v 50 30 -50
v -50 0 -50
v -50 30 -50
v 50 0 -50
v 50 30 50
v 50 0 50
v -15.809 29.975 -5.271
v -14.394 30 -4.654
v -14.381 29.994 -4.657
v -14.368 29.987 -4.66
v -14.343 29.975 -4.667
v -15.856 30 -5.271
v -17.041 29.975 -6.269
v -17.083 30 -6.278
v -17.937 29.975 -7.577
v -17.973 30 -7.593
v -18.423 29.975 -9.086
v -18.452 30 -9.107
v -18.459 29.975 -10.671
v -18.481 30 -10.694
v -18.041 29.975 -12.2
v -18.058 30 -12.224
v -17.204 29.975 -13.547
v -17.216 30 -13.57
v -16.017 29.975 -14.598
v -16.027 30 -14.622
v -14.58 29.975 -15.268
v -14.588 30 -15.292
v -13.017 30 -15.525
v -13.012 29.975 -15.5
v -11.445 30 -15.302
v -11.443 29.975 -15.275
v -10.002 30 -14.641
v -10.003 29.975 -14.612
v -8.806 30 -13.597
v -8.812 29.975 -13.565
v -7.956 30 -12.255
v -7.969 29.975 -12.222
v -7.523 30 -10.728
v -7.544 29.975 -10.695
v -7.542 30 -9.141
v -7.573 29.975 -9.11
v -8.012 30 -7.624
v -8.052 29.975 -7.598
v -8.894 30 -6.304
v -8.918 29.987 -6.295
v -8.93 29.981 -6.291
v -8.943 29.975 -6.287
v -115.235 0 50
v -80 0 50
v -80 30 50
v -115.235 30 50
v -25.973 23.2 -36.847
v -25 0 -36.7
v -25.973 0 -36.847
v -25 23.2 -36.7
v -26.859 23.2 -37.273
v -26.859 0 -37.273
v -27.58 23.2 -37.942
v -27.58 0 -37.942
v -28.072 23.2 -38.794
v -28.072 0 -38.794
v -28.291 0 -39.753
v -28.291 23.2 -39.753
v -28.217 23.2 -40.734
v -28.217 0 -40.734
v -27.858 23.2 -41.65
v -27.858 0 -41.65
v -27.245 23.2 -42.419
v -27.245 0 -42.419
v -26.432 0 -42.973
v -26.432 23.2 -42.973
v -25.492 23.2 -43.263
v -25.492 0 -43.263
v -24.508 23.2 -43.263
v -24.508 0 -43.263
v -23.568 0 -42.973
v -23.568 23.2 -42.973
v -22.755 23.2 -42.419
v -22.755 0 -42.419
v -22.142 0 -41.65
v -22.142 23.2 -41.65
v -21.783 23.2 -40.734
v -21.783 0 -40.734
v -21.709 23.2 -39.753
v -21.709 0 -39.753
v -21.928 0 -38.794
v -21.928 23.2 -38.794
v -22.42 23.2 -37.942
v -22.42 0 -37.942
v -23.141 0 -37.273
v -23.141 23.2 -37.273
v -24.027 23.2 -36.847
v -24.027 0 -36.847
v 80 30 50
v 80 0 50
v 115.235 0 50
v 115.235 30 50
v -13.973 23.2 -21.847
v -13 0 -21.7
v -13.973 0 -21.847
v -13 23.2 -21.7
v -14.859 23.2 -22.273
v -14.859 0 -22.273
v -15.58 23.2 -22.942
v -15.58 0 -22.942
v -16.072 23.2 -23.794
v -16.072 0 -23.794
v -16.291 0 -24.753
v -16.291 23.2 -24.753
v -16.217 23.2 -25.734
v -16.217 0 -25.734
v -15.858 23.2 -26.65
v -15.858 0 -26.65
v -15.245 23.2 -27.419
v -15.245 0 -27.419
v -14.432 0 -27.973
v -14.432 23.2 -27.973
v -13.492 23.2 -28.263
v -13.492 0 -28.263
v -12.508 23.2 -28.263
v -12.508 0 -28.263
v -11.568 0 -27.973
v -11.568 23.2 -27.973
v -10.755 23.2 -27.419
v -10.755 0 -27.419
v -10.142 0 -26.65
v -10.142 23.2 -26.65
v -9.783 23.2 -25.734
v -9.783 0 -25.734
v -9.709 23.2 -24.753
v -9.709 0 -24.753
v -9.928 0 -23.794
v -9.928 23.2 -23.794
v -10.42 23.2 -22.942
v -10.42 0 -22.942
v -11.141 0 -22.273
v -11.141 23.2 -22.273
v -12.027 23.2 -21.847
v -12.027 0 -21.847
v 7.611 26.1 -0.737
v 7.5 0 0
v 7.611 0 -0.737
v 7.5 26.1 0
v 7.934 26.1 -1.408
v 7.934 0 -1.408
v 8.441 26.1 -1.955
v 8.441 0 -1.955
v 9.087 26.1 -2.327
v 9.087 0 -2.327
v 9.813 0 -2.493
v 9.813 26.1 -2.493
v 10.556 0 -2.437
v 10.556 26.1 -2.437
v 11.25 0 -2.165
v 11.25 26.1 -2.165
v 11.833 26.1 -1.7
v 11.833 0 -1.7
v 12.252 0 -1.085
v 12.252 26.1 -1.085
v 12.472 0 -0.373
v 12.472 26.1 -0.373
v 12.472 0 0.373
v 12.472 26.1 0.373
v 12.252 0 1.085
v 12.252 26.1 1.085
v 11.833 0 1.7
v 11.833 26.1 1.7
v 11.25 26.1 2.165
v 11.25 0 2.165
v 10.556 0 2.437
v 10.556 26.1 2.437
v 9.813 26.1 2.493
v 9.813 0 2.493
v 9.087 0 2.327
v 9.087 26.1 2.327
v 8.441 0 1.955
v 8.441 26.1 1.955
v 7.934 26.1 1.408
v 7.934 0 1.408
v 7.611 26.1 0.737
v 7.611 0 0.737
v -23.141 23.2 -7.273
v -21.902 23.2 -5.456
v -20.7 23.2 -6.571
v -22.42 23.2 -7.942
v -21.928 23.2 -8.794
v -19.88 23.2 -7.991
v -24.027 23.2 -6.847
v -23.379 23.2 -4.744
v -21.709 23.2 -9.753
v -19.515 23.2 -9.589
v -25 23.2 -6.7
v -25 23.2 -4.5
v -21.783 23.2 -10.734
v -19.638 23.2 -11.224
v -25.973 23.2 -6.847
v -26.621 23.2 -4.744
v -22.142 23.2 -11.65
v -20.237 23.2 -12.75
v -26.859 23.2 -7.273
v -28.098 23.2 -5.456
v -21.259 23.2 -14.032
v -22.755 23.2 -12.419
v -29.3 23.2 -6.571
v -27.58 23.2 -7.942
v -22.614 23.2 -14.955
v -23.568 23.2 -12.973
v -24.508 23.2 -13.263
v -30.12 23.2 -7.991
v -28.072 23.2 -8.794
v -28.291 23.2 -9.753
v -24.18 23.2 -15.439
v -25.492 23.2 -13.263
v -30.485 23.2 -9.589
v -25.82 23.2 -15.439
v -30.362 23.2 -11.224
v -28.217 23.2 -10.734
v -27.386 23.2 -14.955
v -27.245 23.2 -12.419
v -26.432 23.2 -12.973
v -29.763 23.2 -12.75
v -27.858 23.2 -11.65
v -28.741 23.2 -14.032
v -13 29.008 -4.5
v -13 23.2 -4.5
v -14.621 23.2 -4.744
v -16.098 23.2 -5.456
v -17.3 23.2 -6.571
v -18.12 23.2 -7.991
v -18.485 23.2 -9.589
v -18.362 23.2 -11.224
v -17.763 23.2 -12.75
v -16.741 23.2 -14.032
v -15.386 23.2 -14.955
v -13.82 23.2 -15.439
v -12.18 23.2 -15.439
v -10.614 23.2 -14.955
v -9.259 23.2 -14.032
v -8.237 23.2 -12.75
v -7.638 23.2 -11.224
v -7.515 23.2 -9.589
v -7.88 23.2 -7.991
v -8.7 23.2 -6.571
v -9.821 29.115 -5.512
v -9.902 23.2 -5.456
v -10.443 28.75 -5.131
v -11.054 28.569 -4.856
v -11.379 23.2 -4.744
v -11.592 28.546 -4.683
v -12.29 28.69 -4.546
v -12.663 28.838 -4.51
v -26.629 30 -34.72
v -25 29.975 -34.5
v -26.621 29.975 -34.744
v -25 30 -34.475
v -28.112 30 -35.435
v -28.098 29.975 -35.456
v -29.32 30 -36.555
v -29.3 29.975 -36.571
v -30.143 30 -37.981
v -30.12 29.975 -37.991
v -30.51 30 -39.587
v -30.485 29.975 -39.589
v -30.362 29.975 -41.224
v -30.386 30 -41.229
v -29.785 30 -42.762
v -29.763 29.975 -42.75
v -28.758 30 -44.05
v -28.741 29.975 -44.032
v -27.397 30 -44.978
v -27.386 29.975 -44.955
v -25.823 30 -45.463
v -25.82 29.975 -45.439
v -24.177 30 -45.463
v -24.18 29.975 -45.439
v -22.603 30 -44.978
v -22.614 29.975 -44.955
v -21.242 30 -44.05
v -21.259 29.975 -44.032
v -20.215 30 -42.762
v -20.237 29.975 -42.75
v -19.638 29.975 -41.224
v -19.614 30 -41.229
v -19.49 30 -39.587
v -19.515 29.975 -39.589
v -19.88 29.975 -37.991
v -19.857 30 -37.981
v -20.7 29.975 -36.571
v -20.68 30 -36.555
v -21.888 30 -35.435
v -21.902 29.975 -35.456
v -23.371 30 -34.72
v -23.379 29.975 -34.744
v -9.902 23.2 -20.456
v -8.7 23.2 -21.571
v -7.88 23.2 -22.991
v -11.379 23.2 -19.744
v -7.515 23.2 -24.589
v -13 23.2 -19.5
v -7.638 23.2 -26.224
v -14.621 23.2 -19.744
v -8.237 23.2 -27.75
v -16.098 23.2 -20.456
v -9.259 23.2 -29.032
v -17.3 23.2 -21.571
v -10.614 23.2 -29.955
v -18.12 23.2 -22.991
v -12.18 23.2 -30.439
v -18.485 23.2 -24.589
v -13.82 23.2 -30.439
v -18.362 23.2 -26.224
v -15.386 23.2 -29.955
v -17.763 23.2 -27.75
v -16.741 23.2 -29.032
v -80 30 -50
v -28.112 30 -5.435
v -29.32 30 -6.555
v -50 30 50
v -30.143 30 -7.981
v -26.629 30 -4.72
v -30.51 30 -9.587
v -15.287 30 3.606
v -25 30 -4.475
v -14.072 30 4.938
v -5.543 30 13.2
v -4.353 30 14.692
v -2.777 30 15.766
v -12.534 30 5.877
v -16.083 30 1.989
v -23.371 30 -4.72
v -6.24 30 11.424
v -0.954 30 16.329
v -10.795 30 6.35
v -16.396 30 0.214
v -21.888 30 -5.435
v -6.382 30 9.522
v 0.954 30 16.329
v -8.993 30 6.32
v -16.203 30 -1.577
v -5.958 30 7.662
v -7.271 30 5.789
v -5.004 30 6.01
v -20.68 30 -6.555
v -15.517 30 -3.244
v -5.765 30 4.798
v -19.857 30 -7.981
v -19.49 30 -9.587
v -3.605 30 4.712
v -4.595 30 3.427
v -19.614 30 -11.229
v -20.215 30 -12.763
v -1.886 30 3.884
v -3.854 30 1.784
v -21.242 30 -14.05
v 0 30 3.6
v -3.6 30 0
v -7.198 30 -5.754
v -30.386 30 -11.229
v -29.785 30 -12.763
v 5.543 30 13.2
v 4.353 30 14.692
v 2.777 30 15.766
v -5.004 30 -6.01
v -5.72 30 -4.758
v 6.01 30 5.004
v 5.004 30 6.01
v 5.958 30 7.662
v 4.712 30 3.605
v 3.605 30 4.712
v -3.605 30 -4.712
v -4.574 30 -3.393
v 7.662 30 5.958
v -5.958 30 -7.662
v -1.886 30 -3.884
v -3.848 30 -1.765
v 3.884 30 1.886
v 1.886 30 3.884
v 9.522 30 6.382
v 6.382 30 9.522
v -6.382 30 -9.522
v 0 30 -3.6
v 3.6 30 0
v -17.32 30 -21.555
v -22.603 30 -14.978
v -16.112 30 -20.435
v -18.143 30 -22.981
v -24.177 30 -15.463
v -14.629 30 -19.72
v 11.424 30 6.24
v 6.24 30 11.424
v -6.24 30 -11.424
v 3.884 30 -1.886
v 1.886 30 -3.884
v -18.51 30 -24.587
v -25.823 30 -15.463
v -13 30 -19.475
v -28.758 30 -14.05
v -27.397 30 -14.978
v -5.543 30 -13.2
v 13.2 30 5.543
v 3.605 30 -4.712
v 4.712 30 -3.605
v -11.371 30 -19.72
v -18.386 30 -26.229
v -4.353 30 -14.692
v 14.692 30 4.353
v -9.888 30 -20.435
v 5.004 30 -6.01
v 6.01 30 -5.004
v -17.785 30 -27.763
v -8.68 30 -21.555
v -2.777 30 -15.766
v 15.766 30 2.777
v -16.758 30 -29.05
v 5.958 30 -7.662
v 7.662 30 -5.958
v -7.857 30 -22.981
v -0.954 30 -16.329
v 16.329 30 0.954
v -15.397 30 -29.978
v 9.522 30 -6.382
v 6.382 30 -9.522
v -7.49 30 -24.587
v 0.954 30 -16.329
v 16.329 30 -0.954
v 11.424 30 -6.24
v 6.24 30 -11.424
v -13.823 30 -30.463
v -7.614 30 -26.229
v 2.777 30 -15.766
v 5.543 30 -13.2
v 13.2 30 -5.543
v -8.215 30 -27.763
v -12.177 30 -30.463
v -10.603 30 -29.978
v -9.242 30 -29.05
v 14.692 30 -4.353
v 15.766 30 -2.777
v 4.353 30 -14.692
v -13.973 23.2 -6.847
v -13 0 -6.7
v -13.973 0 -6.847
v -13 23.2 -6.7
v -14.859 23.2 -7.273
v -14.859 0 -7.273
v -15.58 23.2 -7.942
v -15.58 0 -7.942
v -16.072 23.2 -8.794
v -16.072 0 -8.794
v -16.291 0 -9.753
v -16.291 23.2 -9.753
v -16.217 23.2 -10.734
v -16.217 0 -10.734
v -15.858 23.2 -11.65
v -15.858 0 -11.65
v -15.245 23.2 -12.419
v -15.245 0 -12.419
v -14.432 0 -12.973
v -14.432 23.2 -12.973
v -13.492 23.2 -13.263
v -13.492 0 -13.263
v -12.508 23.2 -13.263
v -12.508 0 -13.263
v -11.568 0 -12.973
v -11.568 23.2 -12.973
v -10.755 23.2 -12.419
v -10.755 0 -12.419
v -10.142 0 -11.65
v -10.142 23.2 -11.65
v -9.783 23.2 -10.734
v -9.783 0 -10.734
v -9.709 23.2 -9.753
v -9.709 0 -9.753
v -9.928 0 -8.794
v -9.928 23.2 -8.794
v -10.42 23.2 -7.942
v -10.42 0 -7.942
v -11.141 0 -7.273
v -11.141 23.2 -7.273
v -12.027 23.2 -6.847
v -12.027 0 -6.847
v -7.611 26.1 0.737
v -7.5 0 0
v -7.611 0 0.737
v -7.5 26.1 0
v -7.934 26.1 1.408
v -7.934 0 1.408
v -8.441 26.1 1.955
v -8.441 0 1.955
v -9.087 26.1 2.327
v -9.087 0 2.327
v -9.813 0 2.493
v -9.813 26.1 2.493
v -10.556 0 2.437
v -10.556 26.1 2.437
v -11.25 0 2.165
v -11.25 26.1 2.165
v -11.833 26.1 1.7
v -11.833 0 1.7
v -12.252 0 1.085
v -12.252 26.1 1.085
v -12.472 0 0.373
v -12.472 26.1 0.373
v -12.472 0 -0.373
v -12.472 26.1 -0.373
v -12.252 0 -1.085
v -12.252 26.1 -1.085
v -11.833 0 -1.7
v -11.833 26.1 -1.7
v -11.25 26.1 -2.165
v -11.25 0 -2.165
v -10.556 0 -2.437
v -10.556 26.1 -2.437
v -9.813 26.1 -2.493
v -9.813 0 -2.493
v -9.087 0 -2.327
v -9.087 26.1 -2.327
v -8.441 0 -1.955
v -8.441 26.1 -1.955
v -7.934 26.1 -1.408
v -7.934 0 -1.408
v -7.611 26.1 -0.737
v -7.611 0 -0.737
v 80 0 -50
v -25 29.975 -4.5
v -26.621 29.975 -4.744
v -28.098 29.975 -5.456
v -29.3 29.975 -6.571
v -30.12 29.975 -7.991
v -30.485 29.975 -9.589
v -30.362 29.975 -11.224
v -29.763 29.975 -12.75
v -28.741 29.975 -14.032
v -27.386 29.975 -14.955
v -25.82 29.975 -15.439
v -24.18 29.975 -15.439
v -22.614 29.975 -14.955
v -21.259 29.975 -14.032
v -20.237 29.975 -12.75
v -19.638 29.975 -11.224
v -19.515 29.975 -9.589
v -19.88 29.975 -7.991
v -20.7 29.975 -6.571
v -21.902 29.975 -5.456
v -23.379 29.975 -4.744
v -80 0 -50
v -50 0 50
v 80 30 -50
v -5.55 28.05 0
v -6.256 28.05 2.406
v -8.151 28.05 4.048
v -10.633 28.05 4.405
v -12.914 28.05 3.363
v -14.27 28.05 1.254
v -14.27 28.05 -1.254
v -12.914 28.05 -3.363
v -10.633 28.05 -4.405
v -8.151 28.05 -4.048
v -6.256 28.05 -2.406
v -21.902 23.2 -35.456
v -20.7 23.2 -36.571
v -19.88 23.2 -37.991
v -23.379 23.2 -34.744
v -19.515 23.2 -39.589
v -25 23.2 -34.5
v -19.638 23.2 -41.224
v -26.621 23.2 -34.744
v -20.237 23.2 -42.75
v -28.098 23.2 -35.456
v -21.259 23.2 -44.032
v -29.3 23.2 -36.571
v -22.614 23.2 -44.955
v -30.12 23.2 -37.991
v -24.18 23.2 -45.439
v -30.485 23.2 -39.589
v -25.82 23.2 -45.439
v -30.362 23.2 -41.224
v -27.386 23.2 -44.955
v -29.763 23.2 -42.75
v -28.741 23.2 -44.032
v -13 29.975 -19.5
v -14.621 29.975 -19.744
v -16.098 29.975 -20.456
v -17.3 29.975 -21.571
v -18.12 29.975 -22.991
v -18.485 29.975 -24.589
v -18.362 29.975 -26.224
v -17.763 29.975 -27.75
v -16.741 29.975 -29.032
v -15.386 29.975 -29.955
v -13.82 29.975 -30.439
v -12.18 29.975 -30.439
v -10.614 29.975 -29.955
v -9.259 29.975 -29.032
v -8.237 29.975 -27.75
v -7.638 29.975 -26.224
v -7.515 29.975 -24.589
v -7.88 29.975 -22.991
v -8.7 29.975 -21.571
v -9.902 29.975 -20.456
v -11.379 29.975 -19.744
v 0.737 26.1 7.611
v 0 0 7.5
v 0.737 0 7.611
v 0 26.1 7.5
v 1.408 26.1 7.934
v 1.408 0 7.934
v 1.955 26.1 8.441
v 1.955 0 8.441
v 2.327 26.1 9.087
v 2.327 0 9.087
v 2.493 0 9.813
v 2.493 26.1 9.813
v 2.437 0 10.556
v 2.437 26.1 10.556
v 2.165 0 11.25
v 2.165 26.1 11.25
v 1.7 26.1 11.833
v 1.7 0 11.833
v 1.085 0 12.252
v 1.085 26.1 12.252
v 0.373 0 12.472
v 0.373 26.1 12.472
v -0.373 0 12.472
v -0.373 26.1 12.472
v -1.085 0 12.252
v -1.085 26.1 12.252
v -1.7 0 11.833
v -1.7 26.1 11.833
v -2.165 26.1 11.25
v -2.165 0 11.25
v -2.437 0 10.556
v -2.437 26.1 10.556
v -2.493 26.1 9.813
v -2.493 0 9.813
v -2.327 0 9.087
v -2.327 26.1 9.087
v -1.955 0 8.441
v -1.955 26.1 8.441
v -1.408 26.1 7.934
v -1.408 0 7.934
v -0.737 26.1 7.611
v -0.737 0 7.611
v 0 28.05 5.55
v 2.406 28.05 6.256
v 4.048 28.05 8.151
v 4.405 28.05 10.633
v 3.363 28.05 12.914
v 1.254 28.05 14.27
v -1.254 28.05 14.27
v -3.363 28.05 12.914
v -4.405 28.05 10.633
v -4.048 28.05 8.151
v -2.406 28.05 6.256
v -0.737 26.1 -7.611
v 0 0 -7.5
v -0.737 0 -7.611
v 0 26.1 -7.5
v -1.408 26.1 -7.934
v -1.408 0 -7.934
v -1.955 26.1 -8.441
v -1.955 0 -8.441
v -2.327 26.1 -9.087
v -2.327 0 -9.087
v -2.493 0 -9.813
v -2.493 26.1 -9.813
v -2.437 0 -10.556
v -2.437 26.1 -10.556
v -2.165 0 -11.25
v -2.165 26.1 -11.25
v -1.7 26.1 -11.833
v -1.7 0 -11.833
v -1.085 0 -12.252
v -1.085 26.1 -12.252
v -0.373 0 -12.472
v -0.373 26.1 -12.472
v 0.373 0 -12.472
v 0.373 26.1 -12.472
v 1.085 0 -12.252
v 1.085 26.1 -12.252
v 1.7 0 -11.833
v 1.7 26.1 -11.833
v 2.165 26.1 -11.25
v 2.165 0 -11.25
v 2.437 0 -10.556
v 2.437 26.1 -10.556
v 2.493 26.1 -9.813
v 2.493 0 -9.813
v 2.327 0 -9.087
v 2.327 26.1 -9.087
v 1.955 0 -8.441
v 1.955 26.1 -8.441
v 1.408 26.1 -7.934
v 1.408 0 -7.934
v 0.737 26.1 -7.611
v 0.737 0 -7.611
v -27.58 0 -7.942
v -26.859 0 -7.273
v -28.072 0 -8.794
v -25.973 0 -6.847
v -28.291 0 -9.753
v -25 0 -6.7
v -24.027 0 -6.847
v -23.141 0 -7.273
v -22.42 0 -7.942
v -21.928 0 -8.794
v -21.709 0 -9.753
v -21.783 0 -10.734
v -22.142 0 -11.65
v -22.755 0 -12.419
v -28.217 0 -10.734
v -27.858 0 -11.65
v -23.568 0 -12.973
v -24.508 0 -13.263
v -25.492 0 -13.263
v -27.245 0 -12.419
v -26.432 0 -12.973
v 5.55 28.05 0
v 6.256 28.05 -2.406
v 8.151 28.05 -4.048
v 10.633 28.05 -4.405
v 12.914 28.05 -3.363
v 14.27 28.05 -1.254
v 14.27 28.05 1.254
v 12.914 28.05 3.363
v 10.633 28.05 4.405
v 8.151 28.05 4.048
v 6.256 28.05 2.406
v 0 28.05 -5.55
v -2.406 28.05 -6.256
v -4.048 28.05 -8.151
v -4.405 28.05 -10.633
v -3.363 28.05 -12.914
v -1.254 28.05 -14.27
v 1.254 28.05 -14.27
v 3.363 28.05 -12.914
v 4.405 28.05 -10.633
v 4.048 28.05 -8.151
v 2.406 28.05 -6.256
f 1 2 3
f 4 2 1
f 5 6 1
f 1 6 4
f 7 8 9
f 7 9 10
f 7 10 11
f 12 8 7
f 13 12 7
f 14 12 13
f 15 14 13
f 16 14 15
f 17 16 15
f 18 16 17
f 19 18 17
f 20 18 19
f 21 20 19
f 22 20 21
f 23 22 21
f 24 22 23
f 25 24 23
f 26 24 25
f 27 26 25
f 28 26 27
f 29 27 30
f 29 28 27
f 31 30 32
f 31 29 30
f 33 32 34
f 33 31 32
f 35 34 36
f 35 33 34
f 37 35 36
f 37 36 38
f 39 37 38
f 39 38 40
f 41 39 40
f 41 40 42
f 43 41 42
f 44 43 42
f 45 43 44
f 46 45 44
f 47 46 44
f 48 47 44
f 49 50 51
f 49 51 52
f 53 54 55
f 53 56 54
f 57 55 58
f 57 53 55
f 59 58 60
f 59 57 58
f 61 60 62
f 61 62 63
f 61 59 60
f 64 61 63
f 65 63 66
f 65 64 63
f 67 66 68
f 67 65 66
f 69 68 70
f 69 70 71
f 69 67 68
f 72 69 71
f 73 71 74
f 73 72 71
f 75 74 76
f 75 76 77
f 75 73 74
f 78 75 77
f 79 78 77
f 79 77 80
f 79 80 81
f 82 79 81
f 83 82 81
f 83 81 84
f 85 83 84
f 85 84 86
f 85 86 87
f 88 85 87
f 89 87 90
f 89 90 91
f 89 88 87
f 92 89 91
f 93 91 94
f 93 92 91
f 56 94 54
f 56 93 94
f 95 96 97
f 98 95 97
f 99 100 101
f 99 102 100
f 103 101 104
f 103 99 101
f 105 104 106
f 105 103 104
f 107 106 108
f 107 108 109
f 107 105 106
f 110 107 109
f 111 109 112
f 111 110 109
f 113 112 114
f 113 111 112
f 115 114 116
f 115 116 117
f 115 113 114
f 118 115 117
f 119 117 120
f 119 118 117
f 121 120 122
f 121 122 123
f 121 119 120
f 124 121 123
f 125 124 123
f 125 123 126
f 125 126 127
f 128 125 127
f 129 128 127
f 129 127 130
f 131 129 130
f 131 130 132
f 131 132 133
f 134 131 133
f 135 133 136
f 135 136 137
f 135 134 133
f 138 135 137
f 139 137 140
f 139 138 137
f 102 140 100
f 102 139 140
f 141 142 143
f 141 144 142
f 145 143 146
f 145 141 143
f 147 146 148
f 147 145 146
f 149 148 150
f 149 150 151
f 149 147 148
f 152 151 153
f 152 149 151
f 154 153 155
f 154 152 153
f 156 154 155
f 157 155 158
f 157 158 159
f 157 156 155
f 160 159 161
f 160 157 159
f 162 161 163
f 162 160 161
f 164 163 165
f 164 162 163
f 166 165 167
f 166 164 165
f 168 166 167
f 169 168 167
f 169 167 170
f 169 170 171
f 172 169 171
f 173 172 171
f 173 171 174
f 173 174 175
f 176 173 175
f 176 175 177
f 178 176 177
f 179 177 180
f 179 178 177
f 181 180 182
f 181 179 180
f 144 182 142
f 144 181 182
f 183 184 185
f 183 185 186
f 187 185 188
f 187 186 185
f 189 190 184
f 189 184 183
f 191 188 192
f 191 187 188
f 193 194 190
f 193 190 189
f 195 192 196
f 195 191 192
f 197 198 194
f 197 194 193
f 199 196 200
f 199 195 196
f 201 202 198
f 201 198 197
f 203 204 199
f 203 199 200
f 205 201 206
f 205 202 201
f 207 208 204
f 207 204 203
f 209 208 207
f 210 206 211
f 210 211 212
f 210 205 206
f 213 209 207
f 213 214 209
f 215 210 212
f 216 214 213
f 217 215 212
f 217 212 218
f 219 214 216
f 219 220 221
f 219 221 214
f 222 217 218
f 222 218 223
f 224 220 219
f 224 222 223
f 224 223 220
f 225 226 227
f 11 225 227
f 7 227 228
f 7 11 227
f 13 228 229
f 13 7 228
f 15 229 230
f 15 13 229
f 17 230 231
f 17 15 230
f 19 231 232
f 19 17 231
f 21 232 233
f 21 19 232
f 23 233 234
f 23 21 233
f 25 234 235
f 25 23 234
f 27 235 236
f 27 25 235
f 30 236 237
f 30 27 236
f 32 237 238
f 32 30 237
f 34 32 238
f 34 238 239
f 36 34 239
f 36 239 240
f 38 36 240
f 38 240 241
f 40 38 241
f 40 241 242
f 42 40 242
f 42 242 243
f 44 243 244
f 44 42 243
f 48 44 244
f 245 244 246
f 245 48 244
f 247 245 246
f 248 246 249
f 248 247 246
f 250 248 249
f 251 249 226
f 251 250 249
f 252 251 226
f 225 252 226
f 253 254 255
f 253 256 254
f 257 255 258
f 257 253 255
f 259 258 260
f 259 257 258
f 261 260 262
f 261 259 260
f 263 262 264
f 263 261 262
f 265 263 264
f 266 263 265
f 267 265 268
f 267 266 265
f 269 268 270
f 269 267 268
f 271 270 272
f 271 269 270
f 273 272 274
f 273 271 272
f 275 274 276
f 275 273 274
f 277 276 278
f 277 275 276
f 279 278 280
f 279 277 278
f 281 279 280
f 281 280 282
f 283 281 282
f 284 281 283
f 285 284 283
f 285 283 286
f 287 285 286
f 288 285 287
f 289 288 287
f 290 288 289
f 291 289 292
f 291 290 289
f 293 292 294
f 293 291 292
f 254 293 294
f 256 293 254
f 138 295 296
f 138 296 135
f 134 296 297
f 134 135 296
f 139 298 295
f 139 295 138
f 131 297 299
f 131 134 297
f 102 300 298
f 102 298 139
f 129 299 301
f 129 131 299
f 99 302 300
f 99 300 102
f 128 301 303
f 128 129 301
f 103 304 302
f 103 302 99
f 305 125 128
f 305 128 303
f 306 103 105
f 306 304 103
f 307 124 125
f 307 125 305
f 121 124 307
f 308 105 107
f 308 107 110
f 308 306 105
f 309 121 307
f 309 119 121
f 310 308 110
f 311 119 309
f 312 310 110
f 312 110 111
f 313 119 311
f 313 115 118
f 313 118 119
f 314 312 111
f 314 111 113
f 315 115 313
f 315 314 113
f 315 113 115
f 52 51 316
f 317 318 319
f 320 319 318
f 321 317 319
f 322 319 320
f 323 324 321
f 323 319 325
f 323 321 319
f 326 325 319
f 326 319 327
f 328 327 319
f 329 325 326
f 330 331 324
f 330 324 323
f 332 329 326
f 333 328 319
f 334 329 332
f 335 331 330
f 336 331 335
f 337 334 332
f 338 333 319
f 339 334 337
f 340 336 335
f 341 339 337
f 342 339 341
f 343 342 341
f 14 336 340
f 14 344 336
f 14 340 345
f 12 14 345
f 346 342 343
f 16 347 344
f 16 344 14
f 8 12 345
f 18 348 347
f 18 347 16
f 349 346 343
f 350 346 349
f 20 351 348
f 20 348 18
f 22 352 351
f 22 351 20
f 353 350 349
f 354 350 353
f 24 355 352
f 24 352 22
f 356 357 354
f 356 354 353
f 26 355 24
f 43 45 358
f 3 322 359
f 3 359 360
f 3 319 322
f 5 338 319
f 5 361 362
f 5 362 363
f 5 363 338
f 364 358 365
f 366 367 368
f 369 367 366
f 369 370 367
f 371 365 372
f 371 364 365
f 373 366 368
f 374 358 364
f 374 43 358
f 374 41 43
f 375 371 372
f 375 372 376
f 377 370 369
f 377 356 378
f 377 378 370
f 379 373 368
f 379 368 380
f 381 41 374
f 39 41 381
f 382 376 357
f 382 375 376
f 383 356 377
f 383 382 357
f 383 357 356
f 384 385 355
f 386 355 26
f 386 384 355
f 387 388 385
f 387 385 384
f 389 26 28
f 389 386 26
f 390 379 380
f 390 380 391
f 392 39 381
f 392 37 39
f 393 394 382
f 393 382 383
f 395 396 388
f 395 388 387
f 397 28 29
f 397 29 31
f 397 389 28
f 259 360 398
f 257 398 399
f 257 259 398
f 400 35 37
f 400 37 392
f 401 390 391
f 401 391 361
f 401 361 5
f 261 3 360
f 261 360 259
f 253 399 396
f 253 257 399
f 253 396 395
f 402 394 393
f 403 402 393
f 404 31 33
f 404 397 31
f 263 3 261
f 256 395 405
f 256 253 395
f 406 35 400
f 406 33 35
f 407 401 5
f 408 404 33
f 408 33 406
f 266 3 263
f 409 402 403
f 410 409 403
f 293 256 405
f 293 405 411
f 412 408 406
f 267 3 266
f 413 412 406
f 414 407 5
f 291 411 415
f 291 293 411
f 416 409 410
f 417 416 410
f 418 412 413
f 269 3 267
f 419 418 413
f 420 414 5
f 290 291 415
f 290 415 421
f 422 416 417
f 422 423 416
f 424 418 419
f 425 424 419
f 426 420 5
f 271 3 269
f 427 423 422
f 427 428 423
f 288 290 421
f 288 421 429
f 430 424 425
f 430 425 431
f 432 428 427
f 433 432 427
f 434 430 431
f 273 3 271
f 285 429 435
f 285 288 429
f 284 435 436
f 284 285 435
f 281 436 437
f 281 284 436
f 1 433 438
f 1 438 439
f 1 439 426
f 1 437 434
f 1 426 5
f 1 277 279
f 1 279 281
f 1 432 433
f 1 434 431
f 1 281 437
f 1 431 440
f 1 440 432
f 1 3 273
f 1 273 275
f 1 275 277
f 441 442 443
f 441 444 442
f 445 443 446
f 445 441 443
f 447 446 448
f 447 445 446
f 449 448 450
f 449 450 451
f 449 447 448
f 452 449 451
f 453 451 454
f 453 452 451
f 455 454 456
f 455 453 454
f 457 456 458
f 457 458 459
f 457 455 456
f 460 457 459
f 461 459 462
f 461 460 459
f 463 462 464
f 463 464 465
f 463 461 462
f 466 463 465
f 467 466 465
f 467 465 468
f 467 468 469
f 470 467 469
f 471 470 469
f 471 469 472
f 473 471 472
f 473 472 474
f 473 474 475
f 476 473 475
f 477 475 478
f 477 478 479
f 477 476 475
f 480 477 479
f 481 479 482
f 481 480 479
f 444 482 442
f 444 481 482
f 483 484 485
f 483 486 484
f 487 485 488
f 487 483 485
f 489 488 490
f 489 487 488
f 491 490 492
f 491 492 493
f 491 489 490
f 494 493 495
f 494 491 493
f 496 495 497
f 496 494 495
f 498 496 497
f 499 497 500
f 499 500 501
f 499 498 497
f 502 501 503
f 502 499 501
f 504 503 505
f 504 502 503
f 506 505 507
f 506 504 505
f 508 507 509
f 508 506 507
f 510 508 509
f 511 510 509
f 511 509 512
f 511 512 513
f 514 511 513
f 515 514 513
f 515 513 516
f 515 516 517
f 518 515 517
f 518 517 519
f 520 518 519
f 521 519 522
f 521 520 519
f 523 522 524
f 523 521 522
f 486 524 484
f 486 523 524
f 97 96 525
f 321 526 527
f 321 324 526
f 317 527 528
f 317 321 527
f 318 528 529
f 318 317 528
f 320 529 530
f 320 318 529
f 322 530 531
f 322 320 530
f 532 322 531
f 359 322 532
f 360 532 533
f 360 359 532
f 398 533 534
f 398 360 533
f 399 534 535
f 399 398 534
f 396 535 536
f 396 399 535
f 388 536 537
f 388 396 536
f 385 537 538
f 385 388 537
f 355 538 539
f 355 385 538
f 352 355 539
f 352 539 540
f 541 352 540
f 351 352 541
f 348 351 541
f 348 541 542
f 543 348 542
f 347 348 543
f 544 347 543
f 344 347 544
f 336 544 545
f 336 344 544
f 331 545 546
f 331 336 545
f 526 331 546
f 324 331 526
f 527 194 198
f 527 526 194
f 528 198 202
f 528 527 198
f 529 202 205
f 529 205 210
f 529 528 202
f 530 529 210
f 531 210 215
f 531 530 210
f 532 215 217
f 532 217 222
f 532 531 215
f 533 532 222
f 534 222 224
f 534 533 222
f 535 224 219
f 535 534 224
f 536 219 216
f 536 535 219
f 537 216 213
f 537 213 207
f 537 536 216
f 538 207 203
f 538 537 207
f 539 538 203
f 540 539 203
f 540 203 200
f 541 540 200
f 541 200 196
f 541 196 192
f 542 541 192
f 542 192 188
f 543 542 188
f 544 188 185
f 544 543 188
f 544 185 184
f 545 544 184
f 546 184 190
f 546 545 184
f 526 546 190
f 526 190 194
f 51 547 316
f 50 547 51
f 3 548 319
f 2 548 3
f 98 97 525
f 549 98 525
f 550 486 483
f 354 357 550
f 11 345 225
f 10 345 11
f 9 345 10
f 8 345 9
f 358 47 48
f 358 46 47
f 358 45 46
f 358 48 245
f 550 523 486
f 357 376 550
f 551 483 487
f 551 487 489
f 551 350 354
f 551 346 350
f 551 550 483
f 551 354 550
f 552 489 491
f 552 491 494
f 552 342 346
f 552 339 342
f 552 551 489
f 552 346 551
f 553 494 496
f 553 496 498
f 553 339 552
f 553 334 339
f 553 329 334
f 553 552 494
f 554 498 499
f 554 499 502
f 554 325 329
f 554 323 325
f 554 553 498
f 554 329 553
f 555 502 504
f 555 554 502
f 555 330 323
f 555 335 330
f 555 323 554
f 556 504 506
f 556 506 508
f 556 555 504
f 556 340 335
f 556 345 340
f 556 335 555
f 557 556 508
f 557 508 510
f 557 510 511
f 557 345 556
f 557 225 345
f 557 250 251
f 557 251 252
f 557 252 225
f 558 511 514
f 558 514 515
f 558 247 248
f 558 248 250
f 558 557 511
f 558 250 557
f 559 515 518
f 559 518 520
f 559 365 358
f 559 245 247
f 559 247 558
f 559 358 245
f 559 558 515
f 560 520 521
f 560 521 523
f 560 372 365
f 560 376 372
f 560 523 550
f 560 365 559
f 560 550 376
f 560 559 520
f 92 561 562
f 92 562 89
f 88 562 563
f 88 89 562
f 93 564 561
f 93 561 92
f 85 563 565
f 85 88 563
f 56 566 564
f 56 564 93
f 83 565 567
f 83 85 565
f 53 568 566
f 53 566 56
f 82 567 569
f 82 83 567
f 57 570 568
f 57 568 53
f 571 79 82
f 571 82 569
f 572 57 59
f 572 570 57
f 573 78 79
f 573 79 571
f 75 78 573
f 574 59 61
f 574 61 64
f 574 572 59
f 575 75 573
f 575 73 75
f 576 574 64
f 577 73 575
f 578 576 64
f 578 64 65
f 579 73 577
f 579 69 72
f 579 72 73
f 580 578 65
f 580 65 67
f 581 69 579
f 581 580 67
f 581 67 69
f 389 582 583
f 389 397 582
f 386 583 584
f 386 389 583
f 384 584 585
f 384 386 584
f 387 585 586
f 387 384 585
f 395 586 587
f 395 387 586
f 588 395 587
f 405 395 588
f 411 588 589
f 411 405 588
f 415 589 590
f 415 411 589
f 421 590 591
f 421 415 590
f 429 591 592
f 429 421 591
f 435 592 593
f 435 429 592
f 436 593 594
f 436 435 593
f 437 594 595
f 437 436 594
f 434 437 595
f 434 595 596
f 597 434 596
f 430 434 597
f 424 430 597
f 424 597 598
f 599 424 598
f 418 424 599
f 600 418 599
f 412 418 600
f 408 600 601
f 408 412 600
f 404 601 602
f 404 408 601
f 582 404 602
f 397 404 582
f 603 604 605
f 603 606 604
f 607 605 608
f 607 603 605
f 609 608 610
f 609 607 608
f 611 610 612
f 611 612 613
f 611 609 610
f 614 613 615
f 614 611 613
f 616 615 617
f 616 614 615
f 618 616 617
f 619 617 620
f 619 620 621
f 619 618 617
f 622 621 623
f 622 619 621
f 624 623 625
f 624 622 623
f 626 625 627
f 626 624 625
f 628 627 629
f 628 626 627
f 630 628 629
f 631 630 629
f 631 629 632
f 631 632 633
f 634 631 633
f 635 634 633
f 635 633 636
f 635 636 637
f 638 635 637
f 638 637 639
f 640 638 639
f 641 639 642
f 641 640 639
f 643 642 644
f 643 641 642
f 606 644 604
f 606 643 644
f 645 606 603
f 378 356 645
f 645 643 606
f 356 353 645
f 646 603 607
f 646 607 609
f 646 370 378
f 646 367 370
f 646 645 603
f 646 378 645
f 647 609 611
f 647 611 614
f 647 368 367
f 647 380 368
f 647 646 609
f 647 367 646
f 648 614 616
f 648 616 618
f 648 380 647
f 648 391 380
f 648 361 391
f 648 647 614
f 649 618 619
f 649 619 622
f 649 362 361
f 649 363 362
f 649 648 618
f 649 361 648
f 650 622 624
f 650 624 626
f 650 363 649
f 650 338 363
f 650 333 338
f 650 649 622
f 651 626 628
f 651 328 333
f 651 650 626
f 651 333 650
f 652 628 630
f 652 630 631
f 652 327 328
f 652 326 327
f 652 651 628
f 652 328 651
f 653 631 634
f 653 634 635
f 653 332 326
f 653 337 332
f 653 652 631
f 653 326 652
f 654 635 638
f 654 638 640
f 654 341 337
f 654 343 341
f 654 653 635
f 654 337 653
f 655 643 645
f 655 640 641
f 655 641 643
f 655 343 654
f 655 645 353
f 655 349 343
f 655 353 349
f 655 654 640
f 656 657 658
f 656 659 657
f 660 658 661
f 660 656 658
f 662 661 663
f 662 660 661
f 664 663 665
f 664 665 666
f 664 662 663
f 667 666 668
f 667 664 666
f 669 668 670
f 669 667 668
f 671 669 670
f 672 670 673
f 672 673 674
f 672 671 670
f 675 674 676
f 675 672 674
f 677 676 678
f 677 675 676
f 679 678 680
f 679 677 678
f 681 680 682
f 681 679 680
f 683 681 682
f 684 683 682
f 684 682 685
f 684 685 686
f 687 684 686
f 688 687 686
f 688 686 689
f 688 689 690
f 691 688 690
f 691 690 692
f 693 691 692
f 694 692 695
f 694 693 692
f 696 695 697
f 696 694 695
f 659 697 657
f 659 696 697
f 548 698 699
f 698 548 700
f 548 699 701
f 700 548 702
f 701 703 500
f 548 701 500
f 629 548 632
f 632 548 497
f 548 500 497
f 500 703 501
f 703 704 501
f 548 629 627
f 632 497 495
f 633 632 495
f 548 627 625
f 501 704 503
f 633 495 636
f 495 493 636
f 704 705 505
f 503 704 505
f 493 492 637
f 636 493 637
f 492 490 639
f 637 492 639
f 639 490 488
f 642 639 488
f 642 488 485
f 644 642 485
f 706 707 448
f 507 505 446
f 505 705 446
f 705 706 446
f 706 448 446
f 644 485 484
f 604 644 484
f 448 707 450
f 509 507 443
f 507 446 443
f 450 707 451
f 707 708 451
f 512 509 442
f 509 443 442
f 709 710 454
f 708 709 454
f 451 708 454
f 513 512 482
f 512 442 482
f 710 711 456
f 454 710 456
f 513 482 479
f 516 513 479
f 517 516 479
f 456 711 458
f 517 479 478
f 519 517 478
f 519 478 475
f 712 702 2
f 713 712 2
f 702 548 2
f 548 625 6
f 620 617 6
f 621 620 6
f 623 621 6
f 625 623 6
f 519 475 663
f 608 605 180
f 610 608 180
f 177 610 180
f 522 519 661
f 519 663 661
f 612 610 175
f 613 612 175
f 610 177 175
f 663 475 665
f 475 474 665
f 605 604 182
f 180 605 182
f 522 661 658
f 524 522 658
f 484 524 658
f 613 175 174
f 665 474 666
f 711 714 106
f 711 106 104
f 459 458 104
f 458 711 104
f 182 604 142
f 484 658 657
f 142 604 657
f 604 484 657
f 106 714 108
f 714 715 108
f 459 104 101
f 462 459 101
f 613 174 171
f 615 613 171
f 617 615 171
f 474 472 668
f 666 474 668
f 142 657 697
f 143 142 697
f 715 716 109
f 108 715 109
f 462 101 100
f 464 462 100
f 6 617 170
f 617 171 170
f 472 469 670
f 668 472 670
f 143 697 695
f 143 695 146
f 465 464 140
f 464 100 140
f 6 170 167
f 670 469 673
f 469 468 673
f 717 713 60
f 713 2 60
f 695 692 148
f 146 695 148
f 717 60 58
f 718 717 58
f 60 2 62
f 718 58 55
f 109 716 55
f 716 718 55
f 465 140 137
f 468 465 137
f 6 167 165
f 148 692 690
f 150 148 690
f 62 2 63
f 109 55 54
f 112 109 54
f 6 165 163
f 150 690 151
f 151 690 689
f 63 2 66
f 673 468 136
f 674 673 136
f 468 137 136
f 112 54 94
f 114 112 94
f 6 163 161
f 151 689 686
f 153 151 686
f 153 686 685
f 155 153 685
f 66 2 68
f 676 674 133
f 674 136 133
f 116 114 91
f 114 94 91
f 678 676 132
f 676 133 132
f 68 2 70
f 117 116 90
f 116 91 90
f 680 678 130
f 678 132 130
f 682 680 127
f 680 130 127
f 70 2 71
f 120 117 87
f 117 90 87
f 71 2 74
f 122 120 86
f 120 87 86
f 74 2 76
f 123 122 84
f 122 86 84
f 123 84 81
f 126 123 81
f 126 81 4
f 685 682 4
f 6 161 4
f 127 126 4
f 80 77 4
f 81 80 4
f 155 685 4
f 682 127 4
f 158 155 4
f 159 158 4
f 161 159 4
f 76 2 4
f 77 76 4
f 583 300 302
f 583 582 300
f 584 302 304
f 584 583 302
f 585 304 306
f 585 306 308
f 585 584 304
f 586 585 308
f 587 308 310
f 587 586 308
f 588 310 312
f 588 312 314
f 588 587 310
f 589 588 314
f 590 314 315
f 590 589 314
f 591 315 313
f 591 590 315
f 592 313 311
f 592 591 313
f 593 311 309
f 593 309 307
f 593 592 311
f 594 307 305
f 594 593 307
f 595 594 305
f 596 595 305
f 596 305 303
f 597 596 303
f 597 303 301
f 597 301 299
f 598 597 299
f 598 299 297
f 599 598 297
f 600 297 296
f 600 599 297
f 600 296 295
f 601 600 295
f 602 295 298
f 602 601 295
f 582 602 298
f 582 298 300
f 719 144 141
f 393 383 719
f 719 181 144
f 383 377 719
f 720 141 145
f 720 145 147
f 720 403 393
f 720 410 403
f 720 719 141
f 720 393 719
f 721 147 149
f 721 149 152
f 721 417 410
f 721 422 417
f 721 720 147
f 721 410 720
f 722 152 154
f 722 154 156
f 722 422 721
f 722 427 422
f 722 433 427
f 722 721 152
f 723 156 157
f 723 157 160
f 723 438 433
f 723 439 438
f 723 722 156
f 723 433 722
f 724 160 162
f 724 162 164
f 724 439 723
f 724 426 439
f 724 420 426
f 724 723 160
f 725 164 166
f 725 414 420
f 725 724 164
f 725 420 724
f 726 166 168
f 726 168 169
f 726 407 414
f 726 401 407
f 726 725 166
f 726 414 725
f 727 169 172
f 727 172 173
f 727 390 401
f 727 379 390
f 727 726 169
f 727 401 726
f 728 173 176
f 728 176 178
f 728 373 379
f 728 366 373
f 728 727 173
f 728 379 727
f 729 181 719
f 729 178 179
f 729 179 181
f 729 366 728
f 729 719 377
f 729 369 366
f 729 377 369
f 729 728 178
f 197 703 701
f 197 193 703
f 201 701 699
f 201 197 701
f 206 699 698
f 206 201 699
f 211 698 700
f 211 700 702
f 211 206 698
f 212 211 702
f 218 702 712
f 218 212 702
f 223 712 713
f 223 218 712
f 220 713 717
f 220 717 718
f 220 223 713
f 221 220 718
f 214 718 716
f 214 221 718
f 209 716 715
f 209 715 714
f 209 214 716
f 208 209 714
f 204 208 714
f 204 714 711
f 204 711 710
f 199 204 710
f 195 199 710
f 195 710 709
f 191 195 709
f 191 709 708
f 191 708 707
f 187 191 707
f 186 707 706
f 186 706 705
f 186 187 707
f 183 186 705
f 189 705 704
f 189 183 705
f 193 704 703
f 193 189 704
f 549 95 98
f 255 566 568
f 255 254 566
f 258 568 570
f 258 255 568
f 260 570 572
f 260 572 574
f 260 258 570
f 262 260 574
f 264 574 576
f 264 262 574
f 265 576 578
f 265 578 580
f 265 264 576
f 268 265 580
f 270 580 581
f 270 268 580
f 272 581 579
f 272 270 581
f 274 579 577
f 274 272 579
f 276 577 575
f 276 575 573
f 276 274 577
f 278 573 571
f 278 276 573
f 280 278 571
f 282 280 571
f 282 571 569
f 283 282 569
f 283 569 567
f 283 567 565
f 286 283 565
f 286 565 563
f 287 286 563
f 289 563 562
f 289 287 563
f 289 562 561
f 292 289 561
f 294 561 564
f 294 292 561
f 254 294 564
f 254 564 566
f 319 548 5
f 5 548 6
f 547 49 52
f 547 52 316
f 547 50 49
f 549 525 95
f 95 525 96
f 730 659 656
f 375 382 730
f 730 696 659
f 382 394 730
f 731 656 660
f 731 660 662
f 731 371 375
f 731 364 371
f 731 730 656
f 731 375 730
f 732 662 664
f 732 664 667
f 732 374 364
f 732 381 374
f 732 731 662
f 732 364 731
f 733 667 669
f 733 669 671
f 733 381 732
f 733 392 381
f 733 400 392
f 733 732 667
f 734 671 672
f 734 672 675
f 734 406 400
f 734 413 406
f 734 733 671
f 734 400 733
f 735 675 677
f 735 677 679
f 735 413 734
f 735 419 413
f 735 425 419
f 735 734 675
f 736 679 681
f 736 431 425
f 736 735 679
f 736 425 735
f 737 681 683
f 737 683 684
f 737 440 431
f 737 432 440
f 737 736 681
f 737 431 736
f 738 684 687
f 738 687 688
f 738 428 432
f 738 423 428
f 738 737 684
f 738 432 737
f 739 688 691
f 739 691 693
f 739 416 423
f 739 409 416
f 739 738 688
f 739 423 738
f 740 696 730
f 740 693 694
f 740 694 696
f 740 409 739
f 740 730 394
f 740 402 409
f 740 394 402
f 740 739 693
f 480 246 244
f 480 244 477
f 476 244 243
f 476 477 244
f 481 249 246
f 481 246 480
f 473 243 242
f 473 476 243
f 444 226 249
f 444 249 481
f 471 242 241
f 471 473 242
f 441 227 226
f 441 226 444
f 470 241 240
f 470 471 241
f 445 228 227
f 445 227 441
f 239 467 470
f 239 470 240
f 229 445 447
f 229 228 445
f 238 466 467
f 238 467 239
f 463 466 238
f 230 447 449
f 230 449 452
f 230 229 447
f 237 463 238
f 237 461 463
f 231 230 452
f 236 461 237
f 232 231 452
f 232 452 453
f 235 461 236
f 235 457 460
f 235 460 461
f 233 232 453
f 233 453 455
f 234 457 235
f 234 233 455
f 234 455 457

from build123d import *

# Parameters (mm, degrees)
SKETCH_1_W                  = 100
SKETCH_1_H                  = 100
EXTRUDE_1_DEPTH             = 30
EXTRUDE_1_2_DEPTH           = 30
PATTERN_LINEAR_1_COUNT      = 2
PATTERN_LINEAR_1_PITCH      = 12
PATTERN_LINEAR_1_COUNT_DIR2 = 3
PATTERN_LINEAR_1_PITCH_DIR2 = 15
PATTERN_CIRCULAR_1_COUNT    = 4


with BuildPart() as part:
    # 草图1 → 凸台-拉伸1 (new body)
    with BuildSketch(Plane(origin=(0, 0, 0), x_dir=(1, 0, 0), z_dir=(0, 1, 0))):
        Rectangle(SKETCH_1_W, SKETCH_1_H)
    extrude(amount=EXTRUDE_1_DEPTH)

    # 草图6 → M6 六角圆柱头螺钉的柱形沉头孔2 (revolve, cut)
    with BuildSketch(Plane(origin=(-25, 30, -10), x_dir=(0, 0, 1), z_dir=(1, 0, 0))):
        Polygon((0, 0), (0, 30), (3.3, 30), (3.3, 6.8), (5.5, 6.8), (5.5, 0.025), (5.525, 0), align=None)
    hole_wizard_m6_2 = revolve(axis=Axis((-25, 36.35, -10), (0, -1, 0)), mode=Mode.SUBTRACT)

    # 草图8 → M6 螺纹孔1 (revolve, cut)
    with BuildSketch(Plane(origin=(0, 30, -10), x_dir=(0, 0, 1), z_dir=(1, 0, 0))):
        Polygon((0, 0), (0, 30), (2.5, 30), (2.5, 3.9), (6.4, 0), align=None)
    hole_wizard_m6_1 = revolve(axis=Axis((0, 36.35, -10), (0, -1, 0)), mode=Mode.SUBTRACT)

    # 阵列(线性)1: Hole Wizard M6 _2 2 × 3, 2 skipped
    with Locations(*[(i * PATTERN_LINEAR_1_PITCH, 0, -j * PATTERN_LINEAR_1_PITCH_DIR2) for i in range(PATTERN_LINEAR_1_COUNT) for j in range(PATTERN_LINEAR_1_COUNT_DIR2) if (i, j) not in ((0, 0), (0, 1), (1, 2))]):
        add(hole_wizard_m6_2, mode=Mode.SUBTRACT)

    # 阵列(圆周)1: M6 螺纹孔1 ×4 about axis
    pattern_circular_1_axis = Axis((0, 0, 0), (0, 1, 0))
    for i in range(1, PATTERN_CIRCULAR_1_COUNT):
        add(hole_wizard_m6_1.rotate(pattern_circular_1_axis, i * 360 / PATTERN_CIRCULAR_1_COUNT), mode=Mode.SUBTRACT)


with BuildPart() as body_2:
    # 草图1 → Extrude 1 2 (new body)
    with BuildSketch(Plane(origin=(0, 0, 0), x_dir=(1, 0, 0), z_dir=(0, 1, 0))):
        Polygon((80, -50), (115.235457064, -50), (80, 50), align=None)
    extrude(amount=EXTRUDE_1_2_DEPTH)


with BuildPart() as body_3:
    # 镜向1: mirrored copy
    add(body_2.part.mirror(Plane(origin=(0, 0, 0), x_dir=(0, 0, 1), z_dir=(1, 0, 0))))


solid = Compound([part.part, body_2.part, body_3.part])
